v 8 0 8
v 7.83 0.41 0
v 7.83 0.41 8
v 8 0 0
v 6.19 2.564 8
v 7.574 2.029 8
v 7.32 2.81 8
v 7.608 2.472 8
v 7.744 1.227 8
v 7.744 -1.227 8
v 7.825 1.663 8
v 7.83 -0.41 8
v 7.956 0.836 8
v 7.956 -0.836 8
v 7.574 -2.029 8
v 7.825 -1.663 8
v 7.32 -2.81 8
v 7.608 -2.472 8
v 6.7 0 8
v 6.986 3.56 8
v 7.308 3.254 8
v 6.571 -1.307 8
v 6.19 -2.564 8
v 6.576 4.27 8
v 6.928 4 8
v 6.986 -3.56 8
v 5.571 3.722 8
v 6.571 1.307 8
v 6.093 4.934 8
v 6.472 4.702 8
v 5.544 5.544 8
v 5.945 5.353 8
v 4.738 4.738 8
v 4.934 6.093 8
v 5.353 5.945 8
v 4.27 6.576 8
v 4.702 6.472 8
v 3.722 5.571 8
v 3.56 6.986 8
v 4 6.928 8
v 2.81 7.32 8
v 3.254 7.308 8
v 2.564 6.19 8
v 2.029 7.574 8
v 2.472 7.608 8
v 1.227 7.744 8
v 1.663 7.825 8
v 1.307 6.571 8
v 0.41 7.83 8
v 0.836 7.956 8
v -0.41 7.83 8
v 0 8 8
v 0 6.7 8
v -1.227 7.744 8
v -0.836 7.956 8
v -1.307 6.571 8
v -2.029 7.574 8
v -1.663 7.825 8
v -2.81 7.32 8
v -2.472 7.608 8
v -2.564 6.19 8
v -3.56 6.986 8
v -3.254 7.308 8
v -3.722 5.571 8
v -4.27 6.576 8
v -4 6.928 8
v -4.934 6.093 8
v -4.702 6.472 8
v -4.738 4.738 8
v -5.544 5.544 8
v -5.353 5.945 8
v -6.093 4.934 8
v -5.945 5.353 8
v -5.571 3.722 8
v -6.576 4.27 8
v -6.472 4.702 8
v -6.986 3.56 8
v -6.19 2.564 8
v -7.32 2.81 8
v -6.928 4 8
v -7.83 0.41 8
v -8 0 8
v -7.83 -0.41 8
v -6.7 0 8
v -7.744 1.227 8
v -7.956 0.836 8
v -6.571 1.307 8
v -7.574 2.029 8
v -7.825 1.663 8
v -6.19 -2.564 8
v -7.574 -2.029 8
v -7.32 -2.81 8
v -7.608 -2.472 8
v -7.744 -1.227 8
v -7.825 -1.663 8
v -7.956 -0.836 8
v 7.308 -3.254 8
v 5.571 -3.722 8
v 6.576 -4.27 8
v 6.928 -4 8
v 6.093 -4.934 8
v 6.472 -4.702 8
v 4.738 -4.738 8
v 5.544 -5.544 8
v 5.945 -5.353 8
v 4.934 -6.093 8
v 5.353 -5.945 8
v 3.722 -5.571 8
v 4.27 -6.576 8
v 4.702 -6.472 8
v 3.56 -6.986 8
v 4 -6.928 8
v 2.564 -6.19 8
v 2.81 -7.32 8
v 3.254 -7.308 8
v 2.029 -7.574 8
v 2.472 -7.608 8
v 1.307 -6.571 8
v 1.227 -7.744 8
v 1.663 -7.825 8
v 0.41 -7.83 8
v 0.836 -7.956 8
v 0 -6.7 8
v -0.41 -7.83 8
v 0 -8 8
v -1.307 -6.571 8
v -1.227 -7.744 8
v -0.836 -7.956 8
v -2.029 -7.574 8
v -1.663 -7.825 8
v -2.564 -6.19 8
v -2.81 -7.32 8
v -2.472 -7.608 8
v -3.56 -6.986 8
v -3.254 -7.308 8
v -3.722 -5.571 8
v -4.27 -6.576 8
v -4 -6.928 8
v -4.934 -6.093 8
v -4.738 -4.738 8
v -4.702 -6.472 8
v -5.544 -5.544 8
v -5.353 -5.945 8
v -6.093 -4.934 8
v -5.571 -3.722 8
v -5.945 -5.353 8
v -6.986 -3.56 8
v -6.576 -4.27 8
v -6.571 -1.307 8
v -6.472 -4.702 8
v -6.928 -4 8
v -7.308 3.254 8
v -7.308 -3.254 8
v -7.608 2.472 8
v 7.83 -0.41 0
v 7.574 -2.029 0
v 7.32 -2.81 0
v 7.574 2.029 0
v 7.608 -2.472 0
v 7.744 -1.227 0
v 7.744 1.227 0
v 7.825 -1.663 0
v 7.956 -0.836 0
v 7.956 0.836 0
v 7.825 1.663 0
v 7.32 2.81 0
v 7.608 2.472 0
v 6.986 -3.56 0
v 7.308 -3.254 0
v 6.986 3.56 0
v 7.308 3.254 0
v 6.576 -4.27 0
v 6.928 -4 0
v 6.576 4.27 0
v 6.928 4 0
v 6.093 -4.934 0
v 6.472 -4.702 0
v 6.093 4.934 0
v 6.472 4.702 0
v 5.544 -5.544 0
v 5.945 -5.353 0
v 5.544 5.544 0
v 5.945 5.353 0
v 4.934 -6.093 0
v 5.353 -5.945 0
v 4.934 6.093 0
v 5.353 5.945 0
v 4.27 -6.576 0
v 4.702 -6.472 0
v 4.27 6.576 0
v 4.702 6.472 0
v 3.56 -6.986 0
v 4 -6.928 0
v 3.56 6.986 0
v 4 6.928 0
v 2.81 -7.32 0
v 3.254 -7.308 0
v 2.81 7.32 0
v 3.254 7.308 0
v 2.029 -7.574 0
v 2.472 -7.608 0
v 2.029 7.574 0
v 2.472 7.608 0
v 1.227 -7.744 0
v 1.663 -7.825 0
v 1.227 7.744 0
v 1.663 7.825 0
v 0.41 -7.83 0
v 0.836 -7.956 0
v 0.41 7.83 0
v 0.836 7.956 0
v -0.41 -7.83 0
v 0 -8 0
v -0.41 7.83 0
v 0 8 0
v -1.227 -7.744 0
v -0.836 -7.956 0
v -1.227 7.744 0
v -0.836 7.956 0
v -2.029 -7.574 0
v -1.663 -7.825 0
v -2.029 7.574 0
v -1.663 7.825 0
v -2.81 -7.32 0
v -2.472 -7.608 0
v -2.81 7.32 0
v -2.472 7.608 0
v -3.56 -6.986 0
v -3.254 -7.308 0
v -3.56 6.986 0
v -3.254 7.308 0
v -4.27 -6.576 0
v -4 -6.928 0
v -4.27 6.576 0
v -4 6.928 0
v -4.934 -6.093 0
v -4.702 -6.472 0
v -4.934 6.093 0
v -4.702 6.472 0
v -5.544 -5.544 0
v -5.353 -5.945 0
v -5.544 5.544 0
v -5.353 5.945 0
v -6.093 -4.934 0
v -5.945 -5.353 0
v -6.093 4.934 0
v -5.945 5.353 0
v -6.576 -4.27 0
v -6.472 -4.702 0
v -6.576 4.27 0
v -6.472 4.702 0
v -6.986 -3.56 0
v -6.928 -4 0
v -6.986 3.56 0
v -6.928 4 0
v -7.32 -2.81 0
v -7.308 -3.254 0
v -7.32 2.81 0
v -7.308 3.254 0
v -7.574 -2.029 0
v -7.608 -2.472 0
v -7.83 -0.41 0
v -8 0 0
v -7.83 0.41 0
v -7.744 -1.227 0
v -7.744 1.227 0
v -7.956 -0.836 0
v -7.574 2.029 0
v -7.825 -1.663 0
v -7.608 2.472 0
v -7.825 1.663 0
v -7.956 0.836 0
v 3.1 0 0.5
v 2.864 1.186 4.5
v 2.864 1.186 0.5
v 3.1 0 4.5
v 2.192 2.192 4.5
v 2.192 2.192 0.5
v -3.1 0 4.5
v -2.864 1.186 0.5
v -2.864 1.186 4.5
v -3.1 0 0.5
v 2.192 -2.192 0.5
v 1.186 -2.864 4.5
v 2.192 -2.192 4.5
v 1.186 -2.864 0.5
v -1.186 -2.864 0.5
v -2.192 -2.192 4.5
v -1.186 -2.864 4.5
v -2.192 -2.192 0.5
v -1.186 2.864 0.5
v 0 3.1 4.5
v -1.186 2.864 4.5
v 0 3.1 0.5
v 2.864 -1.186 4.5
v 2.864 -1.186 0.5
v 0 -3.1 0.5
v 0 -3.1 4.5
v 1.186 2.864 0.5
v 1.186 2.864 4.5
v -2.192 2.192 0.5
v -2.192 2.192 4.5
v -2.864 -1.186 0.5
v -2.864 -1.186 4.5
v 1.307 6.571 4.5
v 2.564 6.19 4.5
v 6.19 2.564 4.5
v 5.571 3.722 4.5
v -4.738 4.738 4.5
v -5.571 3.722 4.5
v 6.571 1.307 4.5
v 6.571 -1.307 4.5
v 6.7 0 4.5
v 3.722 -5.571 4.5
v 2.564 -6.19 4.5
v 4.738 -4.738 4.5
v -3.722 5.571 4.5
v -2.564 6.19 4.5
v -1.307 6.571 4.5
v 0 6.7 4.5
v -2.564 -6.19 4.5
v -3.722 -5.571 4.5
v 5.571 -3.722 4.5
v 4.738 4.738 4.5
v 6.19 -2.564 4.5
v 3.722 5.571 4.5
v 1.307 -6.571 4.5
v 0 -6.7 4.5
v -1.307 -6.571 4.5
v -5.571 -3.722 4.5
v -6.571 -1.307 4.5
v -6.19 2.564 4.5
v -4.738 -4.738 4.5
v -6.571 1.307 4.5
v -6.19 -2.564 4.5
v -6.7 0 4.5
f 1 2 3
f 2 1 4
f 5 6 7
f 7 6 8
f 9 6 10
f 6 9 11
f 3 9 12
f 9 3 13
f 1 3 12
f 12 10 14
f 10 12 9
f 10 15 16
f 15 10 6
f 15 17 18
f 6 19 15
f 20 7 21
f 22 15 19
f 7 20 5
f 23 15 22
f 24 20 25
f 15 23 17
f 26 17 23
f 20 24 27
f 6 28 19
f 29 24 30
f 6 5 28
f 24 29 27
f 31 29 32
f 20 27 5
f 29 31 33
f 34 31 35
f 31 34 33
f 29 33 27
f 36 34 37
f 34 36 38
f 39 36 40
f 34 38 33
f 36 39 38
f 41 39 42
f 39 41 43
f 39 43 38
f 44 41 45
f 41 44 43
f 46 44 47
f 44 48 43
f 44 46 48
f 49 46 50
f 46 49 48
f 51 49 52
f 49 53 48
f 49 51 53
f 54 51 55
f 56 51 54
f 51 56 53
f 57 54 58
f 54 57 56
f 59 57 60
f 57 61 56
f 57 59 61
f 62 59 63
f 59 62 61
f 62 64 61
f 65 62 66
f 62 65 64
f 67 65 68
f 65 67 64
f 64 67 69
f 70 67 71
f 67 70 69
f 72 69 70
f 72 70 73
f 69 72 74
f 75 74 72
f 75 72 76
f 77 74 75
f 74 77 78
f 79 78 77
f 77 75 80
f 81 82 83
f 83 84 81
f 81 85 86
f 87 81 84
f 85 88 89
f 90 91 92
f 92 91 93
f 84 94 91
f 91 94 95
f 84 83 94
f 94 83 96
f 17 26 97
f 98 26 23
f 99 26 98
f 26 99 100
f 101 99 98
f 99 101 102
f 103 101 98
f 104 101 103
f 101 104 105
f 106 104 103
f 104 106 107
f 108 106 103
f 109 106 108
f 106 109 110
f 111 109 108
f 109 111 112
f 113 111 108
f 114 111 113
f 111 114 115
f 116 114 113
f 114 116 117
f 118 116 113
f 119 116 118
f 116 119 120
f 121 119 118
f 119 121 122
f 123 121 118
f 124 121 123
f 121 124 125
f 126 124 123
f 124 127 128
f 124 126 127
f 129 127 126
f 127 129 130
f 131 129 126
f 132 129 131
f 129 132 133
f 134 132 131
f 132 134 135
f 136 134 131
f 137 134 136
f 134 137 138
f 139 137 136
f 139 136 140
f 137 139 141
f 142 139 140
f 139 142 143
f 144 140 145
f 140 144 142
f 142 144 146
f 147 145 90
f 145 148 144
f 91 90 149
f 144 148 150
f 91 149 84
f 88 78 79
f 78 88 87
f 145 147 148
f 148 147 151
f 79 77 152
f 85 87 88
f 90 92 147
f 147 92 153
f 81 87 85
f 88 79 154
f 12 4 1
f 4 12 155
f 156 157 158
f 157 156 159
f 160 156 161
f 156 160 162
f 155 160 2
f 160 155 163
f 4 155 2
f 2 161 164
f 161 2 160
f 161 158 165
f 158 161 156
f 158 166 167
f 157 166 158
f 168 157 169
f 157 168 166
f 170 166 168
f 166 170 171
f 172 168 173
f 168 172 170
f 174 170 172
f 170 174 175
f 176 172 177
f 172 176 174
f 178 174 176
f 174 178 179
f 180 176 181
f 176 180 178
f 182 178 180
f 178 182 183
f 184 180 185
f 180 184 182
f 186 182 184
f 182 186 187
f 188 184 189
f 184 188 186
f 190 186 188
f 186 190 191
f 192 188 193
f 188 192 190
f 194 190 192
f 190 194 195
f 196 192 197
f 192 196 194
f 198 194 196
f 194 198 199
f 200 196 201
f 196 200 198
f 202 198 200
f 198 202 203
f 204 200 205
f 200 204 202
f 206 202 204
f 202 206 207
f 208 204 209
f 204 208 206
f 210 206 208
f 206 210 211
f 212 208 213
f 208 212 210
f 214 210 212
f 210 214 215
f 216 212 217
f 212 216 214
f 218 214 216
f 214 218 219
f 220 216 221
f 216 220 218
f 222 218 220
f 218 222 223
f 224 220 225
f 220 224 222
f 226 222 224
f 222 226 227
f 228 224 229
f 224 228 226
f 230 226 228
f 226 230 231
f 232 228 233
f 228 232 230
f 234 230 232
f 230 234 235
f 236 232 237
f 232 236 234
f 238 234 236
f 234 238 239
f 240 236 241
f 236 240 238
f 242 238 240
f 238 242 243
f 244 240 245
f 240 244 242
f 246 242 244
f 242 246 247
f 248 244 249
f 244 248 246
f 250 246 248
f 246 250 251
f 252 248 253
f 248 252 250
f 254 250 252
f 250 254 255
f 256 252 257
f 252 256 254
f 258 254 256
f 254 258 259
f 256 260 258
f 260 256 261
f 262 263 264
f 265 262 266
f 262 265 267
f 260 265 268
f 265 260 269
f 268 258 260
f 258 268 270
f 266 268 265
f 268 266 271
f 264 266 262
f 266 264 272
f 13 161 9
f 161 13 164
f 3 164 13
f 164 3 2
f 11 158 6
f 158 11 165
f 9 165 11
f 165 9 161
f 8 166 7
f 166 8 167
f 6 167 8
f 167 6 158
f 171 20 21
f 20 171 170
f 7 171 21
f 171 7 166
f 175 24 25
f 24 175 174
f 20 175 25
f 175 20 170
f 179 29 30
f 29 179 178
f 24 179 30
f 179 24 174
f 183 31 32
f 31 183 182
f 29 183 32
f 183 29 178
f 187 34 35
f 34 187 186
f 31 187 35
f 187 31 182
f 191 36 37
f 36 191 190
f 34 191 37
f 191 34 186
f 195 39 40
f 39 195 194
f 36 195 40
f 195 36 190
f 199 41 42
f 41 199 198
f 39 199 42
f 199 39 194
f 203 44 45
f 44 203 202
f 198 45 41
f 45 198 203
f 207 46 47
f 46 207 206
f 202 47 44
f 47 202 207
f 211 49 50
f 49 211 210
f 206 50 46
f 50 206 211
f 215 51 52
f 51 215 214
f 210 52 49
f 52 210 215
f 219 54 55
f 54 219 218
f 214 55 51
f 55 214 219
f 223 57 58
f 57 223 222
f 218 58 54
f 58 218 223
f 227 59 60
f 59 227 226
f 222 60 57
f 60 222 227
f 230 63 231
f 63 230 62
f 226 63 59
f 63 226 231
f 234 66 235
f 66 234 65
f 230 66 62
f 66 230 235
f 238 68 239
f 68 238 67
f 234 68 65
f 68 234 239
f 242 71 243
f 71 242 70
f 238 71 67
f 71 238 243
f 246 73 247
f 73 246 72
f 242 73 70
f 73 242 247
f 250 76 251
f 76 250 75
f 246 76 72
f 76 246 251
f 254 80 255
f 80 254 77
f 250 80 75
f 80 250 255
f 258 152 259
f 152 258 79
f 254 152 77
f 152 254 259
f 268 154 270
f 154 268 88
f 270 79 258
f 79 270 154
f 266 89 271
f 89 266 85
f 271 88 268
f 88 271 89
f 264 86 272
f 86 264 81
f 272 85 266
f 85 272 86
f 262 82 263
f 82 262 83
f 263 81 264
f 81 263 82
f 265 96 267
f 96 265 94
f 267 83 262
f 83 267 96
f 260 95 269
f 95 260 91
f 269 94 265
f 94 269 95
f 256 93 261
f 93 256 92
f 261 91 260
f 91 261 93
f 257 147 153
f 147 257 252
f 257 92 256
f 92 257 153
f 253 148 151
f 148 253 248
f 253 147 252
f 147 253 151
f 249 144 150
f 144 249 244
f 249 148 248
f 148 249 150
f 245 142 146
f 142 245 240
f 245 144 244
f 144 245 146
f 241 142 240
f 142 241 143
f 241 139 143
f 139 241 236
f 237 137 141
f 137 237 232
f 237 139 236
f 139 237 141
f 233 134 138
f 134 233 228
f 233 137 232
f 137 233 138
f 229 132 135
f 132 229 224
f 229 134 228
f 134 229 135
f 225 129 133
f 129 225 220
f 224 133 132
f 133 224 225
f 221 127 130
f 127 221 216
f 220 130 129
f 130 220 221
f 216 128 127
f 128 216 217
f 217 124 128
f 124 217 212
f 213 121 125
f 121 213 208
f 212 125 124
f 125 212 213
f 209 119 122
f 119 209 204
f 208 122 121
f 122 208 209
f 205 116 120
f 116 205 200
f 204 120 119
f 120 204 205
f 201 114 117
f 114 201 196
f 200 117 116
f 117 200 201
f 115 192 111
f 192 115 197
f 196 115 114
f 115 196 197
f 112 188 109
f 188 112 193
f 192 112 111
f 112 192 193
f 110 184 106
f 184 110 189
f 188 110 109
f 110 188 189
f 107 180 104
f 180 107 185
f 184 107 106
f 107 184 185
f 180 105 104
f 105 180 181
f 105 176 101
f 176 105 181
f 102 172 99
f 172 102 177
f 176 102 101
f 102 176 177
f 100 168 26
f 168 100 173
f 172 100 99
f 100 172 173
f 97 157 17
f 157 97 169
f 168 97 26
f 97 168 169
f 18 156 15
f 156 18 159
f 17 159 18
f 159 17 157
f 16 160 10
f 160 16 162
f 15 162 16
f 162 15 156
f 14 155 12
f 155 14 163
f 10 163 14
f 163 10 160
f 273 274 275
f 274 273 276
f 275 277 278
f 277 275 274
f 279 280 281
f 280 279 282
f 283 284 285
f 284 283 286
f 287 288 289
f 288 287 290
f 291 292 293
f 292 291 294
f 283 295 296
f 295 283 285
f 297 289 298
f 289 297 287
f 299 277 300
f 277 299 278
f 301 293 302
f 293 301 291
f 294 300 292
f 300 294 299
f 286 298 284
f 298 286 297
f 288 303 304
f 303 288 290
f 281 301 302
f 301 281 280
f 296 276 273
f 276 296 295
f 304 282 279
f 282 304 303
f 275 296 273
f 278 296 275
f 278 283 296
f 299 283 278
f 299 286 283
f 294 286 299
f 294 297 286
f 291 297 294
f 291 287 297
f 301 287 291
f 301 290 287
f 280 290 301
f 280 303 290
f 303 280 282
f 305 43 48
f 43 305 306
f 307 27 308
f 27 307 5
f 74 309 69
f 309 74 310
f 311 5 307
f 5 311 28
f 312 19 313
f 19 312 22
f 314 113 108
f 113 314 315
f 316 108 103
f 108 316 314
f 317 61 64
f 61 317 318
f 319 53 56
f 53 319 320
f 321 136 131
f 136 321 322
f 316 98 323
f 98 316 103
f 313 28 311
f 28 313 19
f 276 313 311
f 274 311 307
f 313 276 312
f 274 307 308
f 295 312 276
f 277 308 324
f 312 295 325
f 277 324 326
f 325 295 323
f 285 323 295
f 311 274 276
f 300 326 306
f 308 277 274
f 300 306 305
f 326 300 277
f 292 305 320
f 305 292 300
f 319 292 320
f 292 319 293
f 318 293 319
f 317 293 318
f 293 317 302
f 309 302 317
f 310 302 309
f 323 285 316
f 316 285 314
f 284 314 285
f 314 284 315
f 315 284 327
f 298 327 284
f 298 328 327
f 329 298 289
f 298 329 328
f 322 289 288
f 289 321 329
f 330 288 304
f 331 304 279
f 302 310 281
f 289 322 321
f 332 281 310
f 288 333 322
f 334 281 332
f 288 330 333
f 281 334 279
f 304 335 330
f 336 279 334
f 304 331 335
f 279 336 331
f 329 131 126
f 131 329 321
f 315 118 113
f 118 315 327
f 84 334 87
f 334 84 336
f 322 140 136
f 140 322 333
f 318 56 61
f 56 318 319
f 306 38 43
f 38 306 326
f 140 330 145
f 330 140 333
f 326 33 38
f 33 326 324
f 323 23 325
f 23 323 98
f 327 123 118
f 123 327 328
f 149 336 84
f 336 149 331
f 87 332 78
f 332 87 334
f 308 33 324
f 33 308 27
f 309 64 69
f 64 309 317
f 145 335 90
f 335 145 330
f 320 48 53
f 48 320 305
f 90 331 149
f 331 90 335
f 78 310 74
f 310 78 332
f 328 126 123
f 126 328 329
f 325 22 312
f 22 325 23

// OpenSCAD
/*
difference() {
    cylinder(8, 7, 7, $fn=8);
    translate([0, 0, 0.5]) cylinder(5, 3+0.1, 3+0.1, $fn=16);
    translate([0, 0, 4.5]) cylinder(10, 6.5, 6.5, $fn=8);
}
*/


difference() {
    union() {
        // 원래 knob 형상
        cylinder(8, 7, 7, $fn=16);

        // 돌기 추가 (8개 반복)
        for (i = [0:60]) {
            rotate([0, 0, i * 6])  // 360도 / 8 = 45도 간격
            translate([7, 0, 0])  // 반지름보다 약간 바깥쪽에 위치, 높이 z=3에서 시작
            cylinder(h=8, r=1, $fn=8);  // 돌기 모양
        }
    }

    // 내부 잘라내는 구조 유지
    translate([0, 0, 0.5]) cylinder(5, 3+0.1, 3+0.1, $fn=16);
    translate([0, 0, 4.5]) cylinder(10, 6.7, 6.7, $fn=32);
}
